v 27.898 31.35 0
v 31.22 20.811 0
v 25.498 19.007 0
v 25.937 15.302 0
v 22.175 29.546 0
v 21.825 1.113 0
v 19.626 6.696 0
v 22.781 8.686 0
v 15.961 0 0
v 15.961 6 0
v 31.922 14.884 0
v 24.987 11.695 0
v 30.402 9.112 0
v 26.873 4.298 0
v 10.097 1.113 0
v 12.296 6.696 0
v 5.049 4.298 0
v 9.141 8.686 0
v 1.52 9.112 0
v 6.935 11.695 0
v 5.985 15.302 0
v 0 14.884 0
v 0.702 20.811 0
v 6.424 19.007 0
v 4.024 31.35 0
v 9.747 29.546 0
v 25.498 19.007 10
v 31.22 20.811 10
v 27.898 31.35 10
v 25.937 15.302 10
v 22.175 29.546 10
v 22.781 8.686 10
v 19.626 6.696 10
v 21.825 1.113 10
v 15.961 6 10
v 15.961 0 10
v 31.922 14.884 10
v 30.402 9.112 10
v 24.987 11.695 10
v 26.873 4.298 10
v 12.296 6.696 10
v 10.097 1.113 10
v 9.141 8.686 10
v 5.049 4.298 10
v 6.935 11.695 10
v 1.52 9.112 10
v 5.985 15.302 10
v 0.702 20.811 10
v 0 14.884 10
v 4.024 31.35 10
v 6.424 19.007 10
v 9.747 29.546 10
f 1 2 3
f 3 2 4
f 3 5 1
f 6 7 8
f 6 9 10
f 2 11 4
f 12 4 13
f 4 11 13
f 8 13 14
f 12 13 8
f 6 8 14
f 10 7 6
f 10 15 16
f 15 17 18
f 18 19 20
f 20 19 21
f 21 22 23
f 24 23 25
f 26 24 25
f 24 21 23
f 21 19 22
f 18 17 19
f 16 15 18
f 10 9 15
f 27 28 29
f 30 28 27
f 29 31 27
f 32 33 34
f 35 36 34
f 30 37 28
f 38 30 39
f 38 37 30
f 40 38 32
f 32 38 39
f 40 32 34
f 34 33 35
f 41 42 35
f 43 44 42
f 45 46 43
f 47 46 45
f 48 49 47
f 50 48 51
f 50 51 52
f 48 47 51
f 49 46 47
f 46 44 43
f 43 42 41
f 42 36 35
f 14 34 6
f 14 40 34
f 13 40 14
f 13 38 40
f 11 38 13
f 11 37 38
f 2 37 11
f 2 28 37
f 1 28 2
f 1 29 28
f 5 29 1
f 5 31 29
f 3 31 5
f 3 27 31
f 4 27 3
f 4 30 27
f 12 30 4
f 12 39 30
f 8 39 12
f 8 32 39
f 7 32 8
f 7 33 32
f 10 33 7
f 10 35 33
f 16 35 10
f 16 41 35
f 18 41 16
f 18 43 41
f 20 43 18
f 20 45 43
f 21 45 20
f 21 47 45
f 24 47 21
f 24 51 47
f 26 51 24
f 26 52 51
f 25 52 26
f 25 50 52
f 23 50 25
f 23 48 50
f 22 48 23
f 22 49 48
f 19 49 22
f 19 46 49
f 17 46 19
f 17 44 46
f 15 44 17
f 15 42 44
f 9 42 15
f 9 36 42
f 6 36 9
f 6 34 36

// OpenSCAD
$fn = 32;

// ----------------------------------------------------------------------
// Clip blank: omega clip, 10 mm thick
// ----------------------------------------------------------------------

// --- parameters (mm) ---
profile_height = 10;      // extrusion height
profile_points = 26;      // points of the closed outline

profile = [[0.702, 20.811], [0, 14.884], [1.52, 9.112], [5.049, 4.298], [10.097, 1.113], [15.961, 0], [21.825, 1.113], [26.873, 4.298], [30.402, 9.112], [31.922, 14.884], [31.22, 20.811], [27.898, 31.35], [22.175, 29.546], [25.498, 19.007], [25.937, 15.302], [24.987, 11.695], [22.781, 8.686], [19.626, 6.696], [15.961, 6], [12.296, 6.696], [9.141, 8.686], [6.935, 11.695], [5.985, 15.302], [6.424, 19.007], [9.747, 29.546], [4.024, 31.35]];  // single closed polygon, 26 points, counter clockwise

// --- the one profile operation ---
linear_extrude(height = profile_height) polygon(points = profile);
